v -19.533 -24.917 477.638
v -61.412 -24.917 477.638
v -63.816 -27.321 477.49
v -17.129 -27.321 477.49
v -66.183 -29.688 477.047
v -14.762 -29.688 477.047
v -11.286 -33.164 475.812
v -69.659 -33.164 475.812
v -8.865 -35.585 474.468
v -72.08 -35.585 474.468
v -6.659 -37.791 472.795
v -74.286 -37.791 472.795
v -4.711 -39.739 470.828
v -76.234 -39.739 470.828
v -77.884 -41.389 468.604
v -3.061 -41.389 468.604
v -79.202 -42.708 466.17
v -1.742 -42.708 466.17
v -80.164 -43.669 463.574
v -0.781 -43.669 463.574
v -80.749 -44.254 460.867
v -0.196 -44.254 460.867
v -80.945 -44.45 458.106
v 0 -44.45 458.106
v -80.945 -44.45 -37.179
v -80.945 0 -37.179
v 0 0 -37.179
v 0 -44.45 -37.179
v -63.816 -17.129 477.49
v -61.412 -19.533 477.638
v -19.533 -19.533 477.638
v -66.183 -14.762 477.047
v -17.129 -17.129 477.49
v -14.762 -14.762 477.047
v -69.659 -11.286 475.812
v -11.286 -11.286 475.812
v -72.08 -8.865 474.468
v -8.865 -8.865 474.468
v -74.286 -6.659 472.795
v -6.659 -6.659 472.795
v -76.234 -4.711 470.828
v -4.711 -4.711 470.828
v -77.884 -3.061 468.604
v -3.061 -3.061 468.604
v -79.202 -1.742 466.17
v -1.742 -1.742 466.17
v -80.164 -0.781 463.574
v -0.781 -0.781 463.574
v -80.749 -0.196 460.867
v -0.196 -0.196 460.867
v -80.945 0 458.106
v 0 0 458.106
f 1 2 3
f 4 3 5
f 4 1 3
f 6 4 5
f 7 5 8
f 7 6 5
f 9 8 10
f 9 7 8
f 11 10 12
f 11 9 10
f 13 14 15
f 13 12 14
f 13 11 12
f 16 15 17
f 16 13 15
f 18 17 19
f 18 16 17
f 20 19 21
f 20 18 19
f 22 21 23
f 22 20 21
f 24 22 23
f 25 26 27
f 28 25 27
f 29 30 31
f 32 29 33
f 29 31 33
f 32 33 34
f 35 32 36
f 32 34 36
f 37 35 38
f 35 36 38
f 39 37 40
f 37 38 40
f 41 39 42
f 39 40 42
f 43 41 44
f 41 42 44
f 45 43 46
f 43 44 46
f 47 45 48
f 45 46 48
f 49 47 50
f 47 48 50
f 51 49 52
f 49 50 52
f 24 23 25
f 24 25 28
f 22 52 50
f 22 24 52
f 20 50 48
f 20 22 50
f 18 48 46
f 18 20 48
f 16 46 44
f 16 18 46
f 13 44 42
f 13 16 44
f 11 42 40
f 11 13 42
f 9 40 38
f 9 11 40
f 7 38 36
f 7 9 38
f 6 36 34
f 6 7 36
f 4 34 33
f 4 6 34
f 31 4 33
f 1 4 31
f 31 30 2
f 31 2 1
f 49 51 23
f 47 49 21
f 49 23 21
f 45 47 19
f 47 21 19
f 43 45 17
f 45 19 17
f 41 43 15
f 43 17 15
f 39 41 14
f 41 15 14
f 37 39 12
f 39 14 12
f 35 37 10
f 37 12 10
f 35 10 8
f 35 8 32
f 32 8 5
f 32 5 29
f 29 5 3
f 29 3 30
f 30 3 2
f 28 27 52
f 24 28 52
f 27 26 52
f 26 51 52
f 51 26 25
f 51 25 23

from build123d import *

# Parameters (mm, degrees)
F0_W      = 80.944866
F0_H      = 514.817506
F1_DEPTH  = 44.45
F2_R      = 19.5326
F1_FACE_W = 80.944866
F1_FACE_H = 44.45
F3_DEPTH  = 62.526703


with BuildPart() as f1:
    # F0 (on Front) → F1 (new body)
    with BuildSketch(Plane.XZ):
        with Locations((-40.472433, 220.22967)):
            Rectangle(F0_W, F0_H)
    extrude(amount=F1_DEPTH)

    # F2
    f2_edges = [f1.edges().sort_by_distance(p)[0] for p in [
        (0, -22.225, 477.638423),
        (-80.944866, -22.225, 477.638423),
        (-40.472433, 0, 477.638423),
        (-40.472433, -44.45, 477.638423),
    ]]
    fillet(f2_edges, radius=F2_R)

    # F1_face (on face) → F3 (join)
    with BuildSketch(Plane(origin=(-40.472433, -22.225, -37.179083), x_dir=(1, 0, 0), z_dir=(0, 0, -1))):
        Rectangle(F1_FACE_W, F1_FACE_H)
    extrude(amount=-F3_DEPTH)


solid = f1.part
